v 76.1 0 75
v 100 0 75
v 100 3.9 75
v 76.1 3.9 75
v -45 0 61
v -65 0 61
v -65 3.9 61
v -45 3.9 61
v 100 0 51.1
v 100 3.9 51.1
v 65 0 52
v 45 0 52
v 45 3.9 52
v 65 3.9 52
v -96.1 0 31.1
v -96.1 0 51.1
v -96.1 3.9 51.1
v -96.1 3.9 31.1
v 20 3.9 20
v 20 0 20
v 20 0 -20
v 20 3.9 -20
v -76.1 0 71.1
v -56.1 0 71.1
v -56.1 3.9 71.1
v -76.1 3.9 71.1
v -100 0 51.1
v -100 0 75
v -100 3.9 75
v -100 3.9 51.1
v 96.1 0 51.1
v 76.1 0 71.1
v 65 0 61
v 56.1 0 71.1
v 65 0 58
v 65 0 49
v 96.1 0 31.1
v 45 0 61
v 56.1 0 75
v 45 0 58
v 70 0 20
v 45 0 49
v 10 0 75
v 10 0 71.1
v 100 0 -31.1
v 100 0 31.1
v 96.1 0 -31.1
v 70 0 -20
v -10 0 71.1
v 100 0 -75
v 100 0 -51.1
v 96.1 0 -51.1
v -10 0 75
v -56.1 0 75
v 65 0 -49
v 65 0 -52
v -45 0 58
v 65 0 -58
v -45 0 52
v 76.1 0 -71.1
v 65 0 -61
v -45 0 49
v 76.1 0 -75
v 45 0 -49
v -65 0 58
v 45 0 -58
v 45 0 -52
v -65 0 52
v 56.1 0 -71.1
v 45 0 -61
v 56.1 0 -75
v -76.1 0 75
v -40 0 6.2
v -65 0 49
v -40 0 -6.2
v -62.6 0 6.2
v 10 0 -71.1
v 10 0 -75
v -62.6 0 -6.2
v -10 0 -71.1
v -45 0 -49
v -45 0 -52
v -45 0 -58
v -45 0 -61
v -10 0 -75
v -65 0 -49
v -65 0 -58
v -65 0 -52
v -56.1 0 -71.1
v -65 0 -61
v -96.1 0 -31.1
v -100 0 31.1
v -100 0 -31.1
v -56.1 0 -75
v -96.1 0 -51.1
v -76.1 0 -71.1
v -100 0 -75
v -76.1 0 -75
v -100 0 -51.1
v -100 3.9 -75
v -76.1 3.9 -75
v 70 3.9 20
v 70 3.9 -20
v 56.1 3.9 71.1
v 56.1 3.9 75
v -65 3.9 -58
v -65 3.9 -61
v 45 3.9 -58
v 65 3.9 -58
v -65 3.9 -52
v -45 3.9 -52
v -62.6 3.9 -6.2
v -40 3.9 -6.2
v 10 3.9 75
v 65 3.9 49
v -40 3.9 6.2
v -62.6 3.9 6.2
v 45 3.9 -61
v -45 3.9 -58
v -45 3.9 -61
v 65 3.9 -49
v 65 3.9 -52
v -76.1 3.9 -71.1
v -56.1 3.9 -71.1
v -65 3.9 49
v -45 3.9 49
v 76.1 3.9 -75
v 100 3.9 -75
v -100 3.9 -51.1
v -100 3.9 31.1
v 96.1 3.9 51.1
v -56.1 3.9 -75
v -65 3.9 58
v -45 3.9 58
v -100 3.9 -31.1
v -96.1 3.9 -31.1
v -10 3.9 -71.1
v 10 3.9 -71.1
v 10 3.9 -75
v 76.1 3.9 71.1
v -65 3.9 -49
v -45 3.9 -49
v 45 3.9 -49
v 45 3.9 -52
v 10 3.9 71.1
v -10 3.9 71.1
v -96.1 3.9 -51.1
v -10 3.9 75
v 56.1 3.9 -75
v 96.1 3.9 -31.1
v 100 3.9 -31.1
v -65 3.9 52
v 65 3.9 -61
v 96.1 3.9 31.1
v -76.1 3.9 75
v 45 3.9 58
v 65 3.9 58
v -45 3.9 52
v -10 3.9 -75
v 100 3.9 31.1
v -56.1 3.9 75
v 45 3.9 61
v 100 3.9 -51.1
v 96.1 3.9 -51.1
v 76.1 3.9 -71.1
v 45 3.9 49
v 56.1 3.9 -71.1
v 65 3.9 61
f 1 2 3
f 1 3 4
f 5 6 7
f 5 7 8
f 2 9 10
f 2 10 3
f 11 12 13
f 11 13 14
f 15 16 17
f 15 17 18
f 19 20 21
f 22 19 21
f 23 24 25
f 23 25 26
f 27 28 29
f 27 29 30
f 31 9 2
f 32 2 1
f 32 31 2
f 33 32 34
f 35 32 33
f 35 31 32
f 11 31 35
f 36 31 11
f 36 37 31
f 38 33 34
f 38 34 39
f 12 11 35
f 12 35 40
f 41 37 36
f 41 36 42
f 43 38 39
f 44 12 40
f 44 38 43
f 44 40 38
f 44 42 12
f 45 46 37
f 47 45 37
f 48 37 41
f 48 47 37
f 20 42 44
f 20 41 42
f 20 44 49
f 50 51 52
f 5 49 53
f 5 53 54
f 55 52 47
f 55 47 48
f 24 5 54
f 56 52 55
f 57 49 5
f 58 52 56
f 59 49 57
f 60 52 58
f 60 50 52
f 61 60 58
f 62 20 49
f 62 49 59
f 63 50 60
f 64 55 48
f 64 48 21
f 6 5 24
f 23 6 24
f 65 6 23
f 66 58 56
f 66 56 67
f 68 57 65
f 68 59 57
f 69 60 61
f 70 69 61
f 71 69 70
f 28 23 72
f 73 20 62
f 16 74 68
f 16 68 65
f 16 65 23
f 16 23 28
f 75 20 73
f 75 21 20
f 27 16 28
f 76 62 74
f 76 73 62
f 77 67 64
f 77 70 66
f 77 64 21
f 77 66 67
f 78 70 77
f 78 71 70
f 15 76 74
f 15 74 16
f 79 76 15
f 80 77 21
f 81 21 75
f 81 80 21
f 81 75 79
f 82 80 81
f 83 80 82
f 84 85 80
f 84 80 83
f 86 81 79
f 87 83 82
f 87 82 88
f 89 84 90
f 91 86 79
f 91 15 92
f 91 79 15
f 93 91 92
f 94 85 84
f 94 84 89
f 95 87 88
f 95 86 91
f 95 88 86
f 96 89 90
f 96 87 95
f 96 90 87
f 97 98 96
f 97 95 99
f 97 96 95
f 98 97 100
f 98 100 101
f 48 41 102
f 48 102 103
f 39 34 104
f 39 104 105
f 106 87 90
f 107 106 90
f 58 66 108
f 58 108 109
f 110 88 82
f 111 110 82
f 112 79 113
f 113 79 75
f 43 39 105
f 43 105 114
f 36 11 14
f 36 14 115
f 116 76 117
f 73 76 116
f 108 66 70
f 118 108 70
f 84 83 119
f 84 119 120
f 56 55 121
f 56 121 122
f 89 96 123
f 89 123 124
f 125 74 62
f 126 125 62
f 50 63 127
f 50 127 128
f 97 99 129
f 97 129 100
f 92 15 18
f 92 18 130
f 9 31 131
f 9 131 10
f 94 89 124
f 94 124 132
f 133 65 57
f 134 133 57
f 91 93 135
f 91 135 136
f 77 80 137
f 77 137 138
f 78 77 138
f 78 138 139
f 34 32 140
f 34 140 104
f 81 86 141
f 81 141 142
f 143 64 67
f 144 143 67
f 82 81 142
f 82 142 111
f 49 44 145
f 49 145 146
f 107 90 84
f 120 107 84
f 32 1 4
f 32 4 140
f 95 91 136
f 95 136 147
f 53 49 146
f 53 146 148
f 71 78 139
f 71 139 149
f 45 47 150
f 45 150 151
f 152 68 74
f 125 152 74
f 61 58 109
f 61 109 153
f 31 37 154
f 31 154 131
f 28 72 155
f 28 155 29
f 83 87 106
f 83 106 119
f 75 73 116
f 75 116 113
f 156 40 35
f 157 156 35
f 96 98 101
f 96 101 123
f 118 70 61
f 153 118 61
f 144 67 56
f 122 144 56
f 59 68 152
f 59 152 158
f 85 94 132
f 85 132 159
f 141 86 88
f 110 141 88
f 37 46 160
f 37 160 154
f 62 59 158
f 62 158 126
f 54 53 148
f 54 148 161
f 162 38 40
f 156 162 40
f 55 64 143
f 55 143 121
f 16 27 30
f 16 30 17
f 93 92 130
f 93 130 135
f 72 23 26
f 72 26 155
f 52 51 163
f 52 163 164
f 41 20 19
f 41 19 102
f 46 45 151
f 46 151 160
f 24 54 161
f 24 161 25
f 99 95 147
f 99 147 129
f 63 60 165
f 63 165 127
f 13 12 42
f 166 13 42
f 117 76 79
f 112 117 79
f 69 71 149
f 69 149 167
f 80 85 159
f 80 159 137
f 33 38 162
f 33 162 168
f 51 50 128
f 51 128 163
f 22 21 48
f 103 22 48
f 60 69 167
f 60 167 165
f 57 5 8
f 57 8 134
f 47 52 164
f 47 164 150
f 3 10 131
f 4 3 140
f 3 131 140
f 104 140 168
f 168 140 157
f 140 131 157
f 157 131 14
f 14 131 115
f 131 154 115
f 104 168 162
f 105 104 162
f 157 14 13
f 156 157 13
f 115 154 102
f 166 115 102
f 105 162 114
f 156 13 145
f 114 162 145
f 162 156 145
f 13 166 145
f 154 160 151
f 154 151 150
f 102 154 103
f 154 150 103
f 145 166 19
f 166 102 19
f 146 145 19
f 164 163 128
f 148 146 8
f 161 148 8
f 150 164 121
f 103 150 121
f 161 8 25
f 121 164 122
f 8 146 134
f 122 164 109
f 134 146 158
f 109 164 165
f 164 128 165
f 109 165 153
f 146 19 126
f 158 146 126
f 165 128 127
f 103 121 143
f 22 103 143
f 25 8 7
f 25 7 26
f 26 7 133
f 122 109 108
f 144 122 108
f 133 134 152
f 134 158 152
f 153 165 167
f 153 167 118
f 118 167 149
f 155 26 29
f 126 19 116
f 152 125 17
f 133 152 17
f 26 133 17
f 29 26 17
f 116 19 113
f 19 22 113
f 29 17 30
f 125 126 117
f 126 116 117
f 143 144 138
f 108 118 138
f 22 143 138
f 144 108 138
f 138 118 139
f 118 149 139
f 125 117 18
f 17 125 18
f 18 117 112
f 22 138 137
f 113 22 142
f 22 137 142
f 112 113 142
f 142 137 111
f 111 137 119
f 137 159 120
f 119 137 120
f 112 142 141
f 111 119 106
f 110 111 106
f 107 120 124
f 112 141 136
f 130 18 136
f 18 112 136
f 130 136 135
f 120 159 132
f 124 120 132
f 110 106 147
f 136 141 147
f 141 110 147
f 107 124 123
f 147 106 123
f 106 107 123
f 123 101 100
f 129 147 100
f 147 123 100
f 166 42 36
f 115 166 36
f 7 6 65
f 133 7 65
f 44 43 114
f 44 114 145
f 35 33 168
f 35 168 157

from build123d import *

# Parameters (mm, degrees)
SKETCH1_W           = 20
SKETCH1_H           = 3
SKETCH1_W_2         = 50
SKETCH1_H_2         = 40
SKETCH1_W_3         = 22.6
SKETCH1_H_3         = 12.4
BOSS_EXTRUDE1_DEPTH = 3.9


with BuildPart() as part:
    # Sketch1 → Boss-Extrude1 (new body)
    with BuildSketch(Plane(origin=(0, 0, 0), x_dir=(1, 0, 0), z_dir=(0, 1, 0))):
        Polygon((-100, 75), (-76.1, 75), (-76.1, 71.1), (-56.1, 71.1), (-56.1, 75), (-10, 75), (-10, 71.1), (10, 71.1), (10, 75), (56.1, 75), (56.1, 71.1), (76.1, 71.1), (76.1, 75), (100, 75), (100, 51.1), (96.1, 51.1), (96.1, 31.1), (100, 31.1), (100, -31.1), (96.1, -31.1), (96.1, -51.1), (100, -51.1), (100, -75), (76.1, -75), (76.1, -71.1), (56.1, -71.1), (56.1, -75), (10, -75), (10, -71.1), (-10, -71.1), (-10, -75), (-56.1, -75), (-56.1, -71.1), (-76.1, -71.1), (-76.1, -75), (-100, -75), (-100, -51.1), (-96.1, -51.1), (-96.1, -31.1), (-100, -31.1), (-100, 31.1), (-96.1, 31.1), (-96.1, 51.1), (-100, 51.1), align=None)
        with Locations((-55, -50.5)):
            Rectangle(SKETCH1_W, SKETCH1_H, mode=Mode.SUBTRACT)
        with Locations((-55, -59.5)):
            Rectangle(SKETCH1_W, SKETCH1_H, mode=Mode.SUBTRACT)
        with Locations((45, 0)):
            Rectangle(SKETCH1_W_2, SKETCH1_H_2, mode=Mode.SUBTRACT)
        with Locations((55, -59.5)):
            Rectangle(SKETCH1_W, SKETCH1_H, mode=Mode.SUBTRACT)
        with Locations((55, -50.5)):
            Rectangle(SKETCH1_W, SKETCH1_H, mode=Mode.SUBTRACT)
        with Locations((55, 50.5)):
            Rectangle(SKETCH1_W, SKETCH1_H, mode=Mode.SUBTRACT)
        with Locations((55, 59.5)):
            Rectangle(SKETCH1_W, SKETCH1_H, mode=Mode.SUBTRACT)
        with Locations((-55, 59.5)):
            Rectangle(SKETCH1_W, SKETCH1_H, mode=Mode.SUBTRACT)
        with Locations((-55, 50.5)):
            Rectangle(SKETCH1_W, SKETCH1_H, mode=Mode.SUBTRACT)
        with Locations((-51.3, 0)):
            Rectangle(SKETCH1_W_3, SKETCH1_H_3, mode=Mode.SUBTRACT)
    extrude(amount=BOSS_EXTRUDE1_DEPTH)


solid = part.part
